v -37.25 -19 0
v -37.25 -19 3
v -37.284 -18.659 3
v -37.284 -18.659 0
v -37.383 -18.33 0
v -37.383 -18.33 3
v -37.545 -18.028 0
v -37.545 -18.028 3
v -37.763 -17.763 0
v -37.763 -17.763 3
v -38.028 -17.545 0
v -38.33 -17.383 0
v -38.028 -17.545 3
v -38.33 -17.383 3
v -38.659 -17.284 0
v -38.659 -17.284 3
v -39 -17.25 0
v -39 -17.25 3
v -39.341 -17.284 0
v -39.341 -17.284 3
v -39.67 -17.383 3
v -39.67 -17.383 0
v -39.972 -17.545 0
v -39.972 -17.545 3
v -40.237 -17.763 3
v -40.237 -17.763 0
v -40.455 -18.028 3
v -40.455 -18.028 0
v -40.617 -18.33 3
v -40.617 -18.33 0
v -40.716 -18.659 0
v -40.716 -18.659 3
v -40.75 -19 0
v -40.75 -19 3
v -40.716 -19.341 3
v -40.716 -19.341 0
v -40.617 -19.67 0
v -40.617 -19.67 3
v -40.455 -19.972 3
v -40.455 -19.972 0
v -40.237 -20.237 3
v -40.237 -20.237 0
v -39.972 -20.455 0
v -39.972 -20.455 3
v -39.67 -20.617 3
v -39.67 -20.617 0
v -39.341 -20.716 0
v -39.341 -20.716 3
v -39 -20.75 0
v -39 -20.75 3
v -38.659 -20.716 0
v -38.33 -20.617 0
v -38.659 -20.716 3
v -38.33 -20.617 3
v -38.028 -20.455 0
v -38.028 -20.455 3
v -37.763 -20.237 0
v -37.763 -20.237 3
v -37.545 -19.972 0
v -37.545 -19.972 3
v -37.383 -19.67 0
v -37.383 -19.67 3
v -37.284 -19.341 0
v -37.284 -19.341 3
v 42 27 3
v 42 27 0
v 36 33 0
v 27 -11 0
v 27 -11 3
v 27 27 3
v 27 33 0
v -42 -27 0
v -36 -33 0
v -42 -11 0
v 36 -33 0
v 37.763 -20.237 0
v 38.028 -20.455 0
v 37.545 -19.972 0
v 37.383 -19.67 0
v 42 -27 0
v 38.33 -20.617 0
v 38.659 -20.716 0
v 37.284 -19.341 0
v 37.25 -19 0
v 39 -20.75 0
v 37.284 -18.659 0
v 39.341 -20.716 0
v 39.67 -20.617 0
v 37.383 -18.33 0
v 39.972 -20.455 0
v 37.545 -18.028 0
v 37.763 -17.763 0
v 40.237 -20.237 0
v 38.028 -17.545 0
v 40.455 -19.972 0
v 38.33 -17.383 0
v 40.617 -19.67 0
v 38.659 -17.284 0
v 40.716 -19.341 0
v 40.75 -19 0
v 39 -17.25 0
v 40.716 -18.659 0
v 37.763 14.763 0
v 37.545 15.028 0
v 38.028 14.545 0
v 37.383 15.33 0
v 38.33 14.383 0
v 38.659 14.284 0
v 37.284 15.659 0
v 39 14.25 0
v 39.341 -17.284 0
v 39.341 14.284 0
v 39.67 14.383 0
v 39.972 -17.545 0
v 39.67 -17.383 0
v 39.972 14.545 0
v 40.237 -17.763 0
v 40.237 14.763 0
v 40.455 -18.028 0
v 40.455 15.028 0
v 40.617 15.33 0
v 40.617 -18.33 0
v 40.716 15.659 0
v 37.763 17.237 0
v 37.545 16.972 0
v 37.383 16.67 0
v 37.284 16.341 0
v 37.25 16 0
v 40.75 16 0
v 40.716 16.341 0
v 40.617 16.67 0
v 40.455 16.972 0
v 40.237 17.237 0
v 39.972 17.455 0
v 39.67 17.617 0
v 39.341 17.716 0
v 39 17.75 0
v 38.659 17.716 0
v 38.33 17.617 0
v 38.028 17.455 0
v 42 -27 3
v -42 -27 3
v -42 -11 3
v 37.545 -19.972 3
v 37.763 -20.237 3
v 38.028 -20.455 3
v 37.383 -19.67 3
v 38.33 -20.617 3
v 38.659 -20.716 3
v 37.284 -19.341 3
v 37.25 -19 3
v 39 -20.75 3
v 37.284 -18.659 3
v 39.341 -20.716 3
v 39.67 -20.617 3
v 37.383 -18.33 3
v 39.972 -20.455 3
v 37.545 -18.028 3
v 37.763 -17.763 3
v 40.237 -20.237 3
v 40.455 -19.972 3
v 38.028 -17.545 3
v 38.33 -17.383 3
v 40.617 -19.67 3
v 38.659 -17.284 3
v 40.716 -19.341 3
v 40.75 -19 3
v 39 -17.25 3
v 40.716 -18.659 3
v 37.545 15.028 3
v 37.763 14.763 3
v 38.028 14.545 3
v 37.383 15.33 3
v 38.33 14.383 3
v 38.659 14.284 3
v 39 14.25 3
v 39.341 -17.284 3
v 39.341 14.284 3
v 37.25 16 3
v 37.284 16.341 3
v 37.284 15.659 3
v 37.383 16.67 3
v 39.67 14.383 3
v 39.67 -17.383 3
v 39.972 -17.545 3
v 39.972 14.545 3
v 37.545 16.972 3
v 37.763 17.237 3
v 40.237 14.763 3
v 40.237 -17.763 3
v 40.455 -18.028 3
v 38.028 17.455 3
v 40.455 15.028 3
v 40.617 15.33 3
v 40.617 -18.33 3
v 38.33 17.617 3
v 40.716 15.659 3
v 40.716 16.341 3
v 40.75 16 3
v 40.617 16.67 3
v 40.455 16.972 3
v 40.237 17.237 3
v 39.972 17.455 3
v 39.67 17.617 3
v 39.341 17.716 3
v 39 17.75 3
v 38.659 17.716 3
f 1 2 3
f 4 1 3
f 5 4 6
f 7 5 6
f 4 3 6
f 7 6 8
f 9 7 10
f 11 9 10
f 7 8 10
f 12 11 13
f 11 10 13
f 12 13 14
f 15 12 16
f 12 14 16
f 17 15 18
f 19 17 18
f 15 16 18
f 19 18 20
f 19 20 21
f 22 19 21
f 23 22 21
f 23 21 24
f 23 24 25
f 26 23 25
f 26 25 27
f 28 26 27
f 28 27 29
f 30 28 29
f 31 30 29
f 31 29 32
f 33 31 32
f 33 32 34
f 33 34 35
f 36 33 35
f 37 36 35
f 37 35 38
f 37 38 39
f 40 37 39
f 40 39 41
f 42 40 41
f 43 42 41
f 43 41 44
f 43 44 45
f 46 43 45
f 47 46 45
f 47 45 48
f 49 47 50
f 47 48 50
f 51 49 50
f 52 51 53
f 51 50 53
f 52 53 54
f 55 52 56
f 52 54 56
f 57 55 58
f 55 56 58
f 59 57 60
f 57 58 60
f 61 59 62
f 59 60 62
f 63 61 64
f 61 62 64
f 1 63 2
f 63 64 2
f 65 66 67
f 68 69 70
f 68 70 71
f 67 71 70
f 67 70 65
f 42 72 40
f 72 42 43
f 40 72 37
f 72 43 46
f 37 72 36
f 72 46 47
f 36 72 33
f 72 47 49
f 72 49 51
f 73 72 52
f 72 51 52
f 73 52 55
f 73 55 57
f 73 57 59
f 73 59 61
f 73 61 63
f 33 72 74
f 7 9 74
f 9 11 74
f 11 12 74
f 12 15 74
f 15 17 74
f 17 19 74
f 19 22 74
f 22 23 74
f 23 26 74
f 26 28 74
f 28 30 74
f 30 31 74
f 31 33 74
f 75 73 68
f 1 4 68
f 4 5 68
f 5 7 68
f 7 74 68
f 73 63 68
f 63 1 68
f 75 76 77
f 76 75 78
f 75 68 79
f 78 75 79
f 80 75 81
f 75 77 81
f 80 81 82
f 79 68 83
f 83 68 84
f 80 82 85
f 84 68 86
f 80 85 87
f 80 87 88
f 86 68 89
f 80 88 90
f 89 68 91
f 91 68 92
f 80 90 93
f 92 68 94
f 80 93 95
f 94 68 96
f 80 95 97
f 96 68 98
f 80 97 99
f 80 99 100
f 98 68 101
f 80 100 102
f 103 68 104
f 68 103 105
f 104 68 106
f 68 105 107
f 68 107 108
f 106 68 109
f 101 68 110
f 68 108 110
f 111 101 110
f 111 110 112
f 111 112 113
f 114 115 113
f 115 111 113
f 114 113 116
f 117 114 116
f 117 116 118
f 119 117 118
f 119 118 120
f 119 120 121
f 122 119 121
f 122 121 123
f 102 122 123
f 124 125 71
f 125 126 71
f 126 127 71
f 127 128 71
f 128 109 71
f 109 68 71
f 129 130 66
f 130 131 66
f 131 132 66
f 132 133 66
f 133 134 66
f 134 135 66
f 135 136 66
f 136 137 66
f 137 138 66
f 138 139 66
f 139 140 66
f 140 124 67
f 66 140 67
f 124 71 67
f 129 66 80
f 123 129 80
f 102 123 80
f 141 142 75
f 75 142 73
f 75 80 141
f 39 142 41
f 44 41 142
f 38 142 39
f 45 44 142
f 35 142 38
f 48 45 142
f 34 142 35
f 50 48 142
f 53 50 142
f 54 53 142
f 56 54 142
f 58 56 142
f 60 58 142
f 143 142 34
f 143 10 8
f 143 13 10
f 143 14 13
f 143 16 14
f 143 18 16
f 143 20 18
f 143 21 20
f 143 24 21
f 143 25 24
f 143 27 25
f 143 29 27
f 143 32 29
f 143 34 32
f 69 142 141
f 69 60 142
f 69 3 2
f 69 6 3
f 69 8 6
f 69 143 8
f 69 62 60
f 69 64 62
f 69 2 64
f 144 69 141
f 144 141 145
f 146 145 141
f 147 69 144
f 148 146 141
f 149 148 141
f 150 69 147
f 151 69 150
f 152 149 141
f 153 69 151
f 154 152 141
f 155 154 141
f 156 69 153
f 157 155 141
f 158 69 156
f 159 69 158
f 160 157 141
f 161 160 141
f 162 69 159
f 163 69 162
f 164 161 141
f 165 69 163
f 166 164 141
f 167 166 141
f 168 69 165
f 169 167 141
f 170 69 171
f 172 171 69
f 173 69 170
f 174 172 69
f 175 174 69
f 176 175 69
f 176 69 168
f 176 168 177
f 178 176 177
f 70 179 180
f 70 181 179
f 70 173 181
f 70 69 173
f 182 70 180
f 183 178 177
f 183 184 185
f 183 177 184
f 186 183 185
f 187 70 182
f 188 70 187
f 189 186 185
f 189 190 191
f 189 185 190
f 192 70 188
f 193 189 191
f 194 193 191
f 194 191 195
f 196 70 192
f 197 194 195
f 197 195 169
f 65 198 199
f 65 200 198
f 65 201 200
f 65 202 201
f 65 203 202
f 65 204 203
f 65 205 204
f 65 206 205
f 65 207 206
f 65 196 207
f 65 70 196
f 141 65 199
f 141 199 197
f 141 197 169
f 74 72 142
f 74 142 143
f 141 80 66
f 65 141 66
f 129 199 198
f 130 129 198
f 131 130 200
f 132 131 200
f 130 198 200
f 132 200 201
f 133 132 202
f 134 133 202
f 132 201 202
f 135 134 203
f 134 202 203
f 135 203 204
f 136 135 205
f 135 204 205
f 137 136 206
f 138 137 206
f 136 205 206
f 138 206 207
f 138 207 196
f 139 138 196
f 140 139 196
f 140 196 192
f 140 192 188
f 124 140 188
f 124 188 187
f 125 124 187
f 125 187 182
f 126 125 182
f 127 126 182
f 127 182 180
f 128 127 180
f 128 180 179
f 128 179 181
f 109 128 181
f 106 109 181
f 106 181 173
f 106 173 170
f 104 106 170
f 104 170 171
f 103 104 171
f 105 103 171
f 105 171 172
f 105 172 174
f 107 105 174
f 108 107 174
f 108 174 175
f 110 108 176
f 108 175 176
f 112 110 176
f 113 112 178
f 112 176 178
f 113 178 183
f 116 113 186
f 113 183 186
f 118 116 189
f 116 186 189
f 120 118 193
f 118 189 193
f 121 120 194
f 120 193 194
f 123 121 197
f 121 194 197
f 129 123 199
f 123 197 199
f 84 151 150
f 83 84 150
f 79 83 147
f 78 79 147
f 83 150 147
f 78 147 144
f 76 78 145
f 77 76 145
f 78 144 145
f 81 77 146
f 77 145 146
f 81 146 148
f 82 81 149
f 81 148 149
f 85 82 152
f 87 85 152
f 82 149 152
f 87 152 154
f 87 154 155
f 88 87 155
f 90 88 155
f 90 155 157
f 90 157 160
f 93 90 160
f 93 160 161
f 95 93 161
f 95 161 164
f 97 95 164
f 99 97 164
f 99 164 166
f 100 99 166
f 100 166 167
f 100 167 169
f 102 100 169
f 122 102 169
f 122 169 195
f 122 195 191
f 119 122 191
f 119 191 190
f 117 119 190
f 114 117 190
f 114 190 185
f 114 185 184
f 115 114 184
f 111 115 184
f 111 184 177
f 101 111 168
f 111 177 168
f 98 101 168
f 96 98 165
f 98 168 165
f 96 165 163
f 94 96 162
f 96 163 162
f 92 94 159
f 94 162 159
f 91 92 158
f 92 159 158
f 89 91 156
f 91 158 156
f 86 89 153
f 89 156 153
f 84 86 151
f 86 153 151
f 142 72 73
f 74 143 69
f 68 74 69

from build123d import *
from OCP.BRepFilletAPI import BRepFilletAPI_MakeChamfer

# Parameters (mm, degrees)
SKETCH1_W           = 84
SKETCH1_H           = 66
BOSS_EXTRUDE1_DEPTH = 3
CHAMFER2_SIZE       = 6
CHAMFER4_SIZE       = 3
CHAMFER4_SIZE_2     = 6
SKETCH2_R           = 1.75
CUT_EXTRUDE1_DEPTH  = 54.4976635
SKETCH3_W           = 69
SKETCH3_H           = 44
CUT_EXTRUDE2_DEPTH  = 10


with BuildPart() as part:
    # Sketch1 → Boss-Extrude1 (new body)
    with BuildSketch(Plane.XY):
        Rectangle(SKETCH1_W, SKETCH1_H)
    extrude(amount=BOSS_EXTRUDE1_DEPTH)

    # Chamfer2
    chamfer2_edges = [part.edges().sort_by_distance(p)[0] for p in [
        (42, -33, 1.5),
        (-42, -33, 1.5),
        (-42, 33, 1.5),
        (42, 33, 1.5),
    ]]
    chamfer(chamfer2_edges, length=CHAMFER2_SIZE)

    # Chamfer4
    chamfer4_edges_1 = [part.edges().sort_by_distance(p)[0] for p in [
        (0, -33, 3),
    ]]
    chamfer4_side_1 = [part.faces().sort_by_distance(p)[0] for p in [
        (0, -33, 2.94),
    ]]
    chamfer4_edges_2 = [part.edges().sort_by_distance(p)[0] for p in [
        (0, 33, 3),
    ]]
    chamfer4_side_2 = [part.faces().sort_by_distance(p)[0] for p in [
        (0, 32.94, 3),
    ]]
    chamfer4 = BRepFilletAPI_MakeChamfer(part.part.solid().wrapped)
    for e in chamfer4_edges_1:
        chamfer4.Add(CHAMFER4_SIZE - 0.0001, CHAMFER4_SIZE_2 - 0.0001, e.wrapped, chamfer4_side_1[0].wrapped)
    for e in chamfer4_edges_2:
        chamfer4.Add(CHAMFER4_SIZE_2 - 0.0001, CHAMFER4_SIZE - 0.0001, e.wrapped, chamfer4_side_2[0].wrapped)
    add(Compound.cast(chamfer4.Shape()), mode=Mode.REPLACE)  # a hair under: the kernel refuses the full size

    # Sketch2 → Cut-Extrude1 (cut, through all)
    with BuildSketch(Plane.XY.offset(3)):
        with Locations((-39, -19)):
            Circle(SKETCH2_R)
        with Locations(Location((39, -19, 0), (0, 0, 180))):
            Circle(SKETCH2_R)
        with Locations((39, 16)):
            Circle(SKETCH2_R)
        with Locations(Location((-39, 16, 0), (0, 0, 180))):
            Circle(SKETCH2_R)
    extrude(amount=-CUT_EXTRUDE1_DEPTH, mode=Mode.SUBTRACT)

    # Sketch3 → Cut-Extrude2 (cut)
    with BuildSketch(Plane.XY.offset(3)):
        with Locations((-7.5, 11)):
            Rectangle(SKETCH3_W, SKETCH3_H)
    extrude(amount=-CUT_EXTRUDE2_DEPTH, mode=Mode.SUBTRACT)


solid = part.part
